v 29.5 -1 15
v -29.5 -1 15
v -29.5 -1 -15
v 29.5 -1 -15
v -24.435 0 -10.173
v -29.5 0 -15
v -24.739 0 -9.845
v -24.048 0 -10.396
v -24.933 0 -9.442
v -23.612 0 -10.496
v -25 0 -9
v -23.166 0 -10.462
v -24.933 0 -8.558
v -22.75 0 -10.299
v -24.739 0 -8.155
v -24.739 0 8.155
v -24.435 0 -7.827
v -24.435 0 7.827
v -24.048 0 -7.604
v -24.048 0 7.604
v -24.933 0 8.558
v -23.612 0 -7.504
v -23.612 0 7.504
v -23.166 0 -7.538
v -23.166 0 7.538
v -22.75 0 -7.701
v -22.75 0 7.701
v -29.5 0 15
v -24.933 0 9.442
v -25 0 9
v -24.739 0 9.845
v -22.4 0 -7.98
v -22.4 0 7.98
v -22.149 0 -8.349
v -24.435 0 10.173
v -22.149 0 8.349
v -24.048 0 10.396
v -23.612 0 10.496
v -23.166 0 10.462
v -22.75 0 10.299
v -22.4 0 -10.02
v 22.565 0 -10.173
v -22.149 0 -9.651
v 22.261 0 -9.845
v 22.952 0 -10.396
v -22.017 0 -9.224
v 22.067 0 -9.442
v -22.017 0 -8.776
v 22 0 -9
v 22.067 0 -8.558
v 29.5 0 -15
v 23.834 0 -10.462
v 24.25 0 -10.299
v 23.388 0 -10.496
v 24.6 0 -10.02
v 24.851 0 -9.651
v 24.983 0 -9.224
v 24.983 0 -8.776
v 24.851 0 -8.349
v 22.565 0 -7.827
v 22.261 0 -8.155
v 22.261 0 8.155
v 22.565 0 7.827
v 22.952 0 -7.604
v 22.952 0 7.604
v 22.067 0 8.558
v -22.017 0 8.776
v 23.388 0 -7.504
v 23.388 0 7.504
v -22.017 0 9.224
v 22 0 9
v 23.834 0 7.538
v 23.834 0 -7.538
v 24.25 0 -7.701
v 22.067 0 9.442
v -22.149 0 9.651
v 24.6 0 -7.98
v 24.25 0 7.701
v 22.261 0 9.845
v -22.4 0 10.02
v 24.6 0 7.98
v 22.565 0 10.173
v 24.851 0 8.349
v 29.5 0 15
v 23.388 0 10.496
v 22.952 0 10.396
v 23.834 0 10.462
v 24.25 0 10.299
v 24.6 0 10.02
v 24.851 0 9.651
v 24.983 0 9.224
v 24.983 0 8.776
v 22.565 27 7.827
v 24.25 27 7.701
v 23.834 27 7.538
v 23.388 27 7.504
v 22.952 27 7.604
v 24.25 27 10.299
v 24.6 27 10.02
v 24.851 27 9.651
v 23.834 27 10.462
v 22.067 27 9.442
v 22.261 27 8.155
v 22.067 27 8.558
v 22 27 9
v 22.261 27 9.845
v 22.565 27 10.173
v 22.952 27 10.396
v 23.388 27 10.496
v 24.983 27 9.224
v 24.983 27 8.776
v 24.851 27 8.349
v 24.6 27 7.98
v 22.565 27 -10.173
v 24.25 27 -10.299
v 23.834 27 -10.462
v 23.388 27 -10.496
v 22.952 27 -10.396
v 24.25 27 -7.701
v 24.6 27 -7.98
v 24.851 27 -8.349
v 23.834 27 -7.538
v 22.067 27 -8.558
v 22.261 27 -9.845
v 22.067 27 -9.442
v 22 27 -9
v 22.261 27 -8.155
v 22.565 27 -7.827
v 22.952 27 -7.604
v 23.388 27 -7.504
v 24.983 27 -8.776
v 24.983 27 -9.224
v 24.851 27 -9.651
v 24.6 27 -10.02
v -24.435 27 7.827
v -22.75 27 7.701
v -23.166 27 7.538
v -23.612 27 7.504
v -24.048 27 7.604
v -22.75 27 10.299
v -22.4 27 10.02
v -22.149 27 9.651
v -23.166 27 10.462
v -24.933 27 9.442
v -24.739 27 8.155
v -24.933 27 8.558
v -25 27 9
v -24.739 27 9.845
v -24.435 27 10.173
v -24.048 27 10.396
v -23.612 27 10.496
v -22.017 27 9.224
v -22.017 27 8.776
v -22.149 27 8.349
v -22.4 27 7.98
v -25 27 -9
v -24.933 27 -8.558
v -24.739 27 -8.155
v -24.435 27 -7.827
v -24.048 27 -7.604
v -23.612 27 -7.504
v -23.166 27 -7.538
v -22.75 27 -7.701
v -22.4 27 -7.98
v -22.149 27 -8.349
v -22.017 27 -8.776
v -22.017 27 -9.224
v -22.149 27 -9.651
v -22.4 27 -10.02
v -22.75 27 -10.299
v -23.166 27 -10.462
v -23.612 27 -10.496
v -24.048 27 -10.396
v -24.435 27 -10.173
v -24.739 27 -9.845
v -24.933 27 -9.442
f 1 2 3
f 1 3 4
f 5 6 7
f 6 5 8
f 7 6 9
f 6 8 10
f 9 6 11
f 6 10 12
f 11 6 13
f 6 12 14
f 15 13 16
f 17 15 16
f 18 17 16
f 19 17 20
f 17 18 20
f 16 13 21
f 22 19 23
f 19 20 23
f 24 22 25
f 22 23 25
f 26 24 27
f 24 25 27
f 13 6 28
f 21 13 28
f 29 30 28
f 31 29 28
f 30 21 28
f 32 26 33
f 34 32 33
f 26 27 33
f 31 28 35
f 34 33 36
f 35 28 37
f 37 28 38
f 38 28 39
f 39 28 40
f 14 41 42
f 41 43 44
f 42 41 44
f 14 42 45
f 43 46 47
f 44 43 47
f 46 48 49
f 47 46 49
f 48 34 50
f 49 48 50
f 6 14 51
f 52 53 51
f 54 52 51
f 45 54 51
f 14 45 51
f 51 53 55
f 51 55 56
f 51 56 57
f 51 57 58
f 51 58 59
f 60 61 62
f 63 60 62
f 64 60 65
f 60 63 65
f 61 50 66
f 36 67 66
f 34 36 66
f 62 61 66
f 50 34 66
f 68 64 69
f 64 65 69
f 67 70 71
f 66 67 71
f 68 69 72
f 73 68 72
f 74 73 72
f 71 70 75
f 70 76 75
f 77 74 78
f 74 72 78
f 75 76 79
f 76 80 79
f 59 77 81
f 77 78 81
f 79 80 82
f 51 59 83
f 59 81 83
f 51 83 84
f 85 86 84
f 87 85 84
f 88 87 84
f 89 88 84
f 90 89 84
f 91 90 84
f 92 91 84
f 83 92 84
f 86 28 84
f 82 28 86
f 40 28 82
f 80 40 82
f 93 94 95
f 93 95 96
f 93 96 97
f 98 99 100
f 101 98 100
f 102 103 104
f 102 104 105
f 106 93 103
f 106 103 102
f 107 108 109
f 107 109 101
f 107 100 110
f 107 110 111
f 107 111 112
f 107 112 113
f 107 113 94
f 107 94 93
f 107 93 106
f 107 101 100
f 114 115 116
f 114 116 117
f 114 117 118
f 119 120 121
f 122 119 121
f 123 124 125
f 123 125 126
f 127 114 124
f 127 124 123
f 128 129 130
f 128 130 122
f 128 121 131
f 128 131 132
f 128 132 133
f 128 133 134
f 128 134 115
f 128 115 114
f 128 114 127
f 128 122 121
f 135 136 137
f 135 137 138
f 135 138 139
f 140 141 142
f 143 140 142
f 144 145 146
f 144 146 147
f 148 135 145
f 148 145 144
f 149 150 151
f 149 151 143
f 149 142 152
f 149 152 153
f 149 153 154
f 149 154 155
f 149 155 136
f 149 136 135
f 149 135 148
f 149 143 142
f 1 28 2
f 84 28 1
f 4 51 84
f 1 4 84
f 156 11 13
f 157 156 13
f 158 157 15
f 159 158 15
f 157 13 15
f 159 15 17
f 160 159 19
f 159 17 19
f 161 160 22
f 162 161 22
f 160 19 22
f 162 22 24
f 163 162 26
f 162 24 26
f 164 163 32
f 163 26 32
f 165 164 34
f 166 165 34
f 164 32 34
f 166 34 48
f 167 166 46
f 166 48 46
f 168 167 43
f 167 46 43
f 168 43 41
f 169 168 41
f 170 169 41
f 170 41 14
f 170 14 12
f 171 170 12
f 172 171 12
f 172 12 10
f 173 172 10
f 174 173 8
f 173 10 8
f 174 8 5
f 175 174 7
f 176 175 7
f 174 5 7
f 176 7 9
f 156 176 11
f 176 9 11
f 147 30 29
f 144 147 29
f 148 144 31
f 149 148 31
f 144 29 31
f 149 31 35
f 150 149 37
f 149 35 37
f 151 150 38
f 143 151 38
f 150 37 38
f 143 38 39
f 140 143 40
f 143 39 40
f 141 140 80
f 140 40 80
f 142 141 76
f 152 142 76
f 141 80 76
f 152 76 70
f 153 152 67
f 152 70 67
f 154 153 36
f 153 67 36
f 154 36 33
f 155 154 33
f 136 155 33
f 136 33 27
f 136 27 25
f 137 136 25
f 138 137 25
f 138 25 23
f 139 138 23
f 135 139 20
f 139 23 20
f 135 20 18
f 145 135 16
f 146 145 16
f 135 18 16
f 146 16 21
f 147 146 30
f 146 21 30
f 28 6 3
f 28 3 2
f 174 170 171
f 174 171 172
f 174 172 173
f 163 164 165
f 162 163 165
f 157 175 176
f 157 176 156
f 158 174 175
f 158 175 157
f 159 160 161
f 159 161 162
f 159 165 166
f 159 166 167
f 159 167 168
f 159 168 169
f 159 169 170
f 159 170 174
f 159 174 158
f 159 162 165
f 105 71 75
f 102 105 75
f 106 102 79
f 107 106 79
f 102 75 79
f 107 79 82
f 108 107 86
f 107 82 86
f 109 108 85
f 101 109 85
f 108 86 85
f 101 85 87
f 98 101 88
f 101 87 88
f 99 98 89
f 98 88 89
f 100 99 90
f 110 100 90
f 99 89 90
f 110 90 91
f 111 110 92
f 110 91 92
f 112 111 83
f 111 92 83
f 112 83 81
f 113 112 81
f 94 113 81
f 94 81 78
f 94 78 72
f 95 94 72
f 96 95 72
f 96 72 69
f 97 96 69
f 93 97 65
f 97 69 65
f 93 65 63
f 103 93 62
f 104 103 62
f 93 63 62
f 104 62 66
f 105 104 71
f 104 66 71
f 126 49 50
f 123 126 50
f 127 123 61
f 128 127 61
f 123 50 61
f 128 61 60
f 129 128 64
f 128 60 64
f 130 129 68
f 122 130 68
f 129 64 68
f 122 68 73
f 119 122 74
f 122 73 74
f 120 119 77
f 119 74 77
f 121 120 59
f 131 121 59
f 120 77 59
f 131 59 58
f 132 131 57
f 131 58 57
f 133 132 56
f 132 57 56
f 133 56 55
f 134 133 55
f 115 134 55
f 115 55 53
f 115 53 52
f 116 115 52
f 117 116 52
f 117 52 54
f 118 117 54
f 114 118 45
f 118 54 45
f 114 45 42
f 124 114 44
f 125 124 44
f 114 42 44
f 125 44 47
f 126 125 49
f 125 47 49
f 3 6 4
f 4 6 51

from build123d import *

# Parameters (mm, degrees)
F0_W     = 59
F0_H     = 30
F1_DEPTH = 1
F2_R     = 1.5
F3_DEPTH = 27


with BuildPart() as f1:
    # F0 (on Front) → F1 (new body)
    with BuildSketch(Plane.XZ):
        Rectangle(F0_W, F0_H)
    extrude(amount=F1_DEPTH)

    # F2 (on face) → F3 (join)
    with BuildSketch(Plane(origin=(0, 0, 0), x_dir=(-1, 0, 0), z_dir=(0, 1, 0))):
        with Locations((23.5, 9)):
            Circle(F2_R)
        with Locations((-23.5, 9)):
            Circle(F2_R)
        with Locations((-23.5, -9)):
            Circle(F2_R)
        with Locations((23.5, -9)):
            Circle(F2_R)
    extrude(amount=F3_DEPTH)


solid = f1.part
